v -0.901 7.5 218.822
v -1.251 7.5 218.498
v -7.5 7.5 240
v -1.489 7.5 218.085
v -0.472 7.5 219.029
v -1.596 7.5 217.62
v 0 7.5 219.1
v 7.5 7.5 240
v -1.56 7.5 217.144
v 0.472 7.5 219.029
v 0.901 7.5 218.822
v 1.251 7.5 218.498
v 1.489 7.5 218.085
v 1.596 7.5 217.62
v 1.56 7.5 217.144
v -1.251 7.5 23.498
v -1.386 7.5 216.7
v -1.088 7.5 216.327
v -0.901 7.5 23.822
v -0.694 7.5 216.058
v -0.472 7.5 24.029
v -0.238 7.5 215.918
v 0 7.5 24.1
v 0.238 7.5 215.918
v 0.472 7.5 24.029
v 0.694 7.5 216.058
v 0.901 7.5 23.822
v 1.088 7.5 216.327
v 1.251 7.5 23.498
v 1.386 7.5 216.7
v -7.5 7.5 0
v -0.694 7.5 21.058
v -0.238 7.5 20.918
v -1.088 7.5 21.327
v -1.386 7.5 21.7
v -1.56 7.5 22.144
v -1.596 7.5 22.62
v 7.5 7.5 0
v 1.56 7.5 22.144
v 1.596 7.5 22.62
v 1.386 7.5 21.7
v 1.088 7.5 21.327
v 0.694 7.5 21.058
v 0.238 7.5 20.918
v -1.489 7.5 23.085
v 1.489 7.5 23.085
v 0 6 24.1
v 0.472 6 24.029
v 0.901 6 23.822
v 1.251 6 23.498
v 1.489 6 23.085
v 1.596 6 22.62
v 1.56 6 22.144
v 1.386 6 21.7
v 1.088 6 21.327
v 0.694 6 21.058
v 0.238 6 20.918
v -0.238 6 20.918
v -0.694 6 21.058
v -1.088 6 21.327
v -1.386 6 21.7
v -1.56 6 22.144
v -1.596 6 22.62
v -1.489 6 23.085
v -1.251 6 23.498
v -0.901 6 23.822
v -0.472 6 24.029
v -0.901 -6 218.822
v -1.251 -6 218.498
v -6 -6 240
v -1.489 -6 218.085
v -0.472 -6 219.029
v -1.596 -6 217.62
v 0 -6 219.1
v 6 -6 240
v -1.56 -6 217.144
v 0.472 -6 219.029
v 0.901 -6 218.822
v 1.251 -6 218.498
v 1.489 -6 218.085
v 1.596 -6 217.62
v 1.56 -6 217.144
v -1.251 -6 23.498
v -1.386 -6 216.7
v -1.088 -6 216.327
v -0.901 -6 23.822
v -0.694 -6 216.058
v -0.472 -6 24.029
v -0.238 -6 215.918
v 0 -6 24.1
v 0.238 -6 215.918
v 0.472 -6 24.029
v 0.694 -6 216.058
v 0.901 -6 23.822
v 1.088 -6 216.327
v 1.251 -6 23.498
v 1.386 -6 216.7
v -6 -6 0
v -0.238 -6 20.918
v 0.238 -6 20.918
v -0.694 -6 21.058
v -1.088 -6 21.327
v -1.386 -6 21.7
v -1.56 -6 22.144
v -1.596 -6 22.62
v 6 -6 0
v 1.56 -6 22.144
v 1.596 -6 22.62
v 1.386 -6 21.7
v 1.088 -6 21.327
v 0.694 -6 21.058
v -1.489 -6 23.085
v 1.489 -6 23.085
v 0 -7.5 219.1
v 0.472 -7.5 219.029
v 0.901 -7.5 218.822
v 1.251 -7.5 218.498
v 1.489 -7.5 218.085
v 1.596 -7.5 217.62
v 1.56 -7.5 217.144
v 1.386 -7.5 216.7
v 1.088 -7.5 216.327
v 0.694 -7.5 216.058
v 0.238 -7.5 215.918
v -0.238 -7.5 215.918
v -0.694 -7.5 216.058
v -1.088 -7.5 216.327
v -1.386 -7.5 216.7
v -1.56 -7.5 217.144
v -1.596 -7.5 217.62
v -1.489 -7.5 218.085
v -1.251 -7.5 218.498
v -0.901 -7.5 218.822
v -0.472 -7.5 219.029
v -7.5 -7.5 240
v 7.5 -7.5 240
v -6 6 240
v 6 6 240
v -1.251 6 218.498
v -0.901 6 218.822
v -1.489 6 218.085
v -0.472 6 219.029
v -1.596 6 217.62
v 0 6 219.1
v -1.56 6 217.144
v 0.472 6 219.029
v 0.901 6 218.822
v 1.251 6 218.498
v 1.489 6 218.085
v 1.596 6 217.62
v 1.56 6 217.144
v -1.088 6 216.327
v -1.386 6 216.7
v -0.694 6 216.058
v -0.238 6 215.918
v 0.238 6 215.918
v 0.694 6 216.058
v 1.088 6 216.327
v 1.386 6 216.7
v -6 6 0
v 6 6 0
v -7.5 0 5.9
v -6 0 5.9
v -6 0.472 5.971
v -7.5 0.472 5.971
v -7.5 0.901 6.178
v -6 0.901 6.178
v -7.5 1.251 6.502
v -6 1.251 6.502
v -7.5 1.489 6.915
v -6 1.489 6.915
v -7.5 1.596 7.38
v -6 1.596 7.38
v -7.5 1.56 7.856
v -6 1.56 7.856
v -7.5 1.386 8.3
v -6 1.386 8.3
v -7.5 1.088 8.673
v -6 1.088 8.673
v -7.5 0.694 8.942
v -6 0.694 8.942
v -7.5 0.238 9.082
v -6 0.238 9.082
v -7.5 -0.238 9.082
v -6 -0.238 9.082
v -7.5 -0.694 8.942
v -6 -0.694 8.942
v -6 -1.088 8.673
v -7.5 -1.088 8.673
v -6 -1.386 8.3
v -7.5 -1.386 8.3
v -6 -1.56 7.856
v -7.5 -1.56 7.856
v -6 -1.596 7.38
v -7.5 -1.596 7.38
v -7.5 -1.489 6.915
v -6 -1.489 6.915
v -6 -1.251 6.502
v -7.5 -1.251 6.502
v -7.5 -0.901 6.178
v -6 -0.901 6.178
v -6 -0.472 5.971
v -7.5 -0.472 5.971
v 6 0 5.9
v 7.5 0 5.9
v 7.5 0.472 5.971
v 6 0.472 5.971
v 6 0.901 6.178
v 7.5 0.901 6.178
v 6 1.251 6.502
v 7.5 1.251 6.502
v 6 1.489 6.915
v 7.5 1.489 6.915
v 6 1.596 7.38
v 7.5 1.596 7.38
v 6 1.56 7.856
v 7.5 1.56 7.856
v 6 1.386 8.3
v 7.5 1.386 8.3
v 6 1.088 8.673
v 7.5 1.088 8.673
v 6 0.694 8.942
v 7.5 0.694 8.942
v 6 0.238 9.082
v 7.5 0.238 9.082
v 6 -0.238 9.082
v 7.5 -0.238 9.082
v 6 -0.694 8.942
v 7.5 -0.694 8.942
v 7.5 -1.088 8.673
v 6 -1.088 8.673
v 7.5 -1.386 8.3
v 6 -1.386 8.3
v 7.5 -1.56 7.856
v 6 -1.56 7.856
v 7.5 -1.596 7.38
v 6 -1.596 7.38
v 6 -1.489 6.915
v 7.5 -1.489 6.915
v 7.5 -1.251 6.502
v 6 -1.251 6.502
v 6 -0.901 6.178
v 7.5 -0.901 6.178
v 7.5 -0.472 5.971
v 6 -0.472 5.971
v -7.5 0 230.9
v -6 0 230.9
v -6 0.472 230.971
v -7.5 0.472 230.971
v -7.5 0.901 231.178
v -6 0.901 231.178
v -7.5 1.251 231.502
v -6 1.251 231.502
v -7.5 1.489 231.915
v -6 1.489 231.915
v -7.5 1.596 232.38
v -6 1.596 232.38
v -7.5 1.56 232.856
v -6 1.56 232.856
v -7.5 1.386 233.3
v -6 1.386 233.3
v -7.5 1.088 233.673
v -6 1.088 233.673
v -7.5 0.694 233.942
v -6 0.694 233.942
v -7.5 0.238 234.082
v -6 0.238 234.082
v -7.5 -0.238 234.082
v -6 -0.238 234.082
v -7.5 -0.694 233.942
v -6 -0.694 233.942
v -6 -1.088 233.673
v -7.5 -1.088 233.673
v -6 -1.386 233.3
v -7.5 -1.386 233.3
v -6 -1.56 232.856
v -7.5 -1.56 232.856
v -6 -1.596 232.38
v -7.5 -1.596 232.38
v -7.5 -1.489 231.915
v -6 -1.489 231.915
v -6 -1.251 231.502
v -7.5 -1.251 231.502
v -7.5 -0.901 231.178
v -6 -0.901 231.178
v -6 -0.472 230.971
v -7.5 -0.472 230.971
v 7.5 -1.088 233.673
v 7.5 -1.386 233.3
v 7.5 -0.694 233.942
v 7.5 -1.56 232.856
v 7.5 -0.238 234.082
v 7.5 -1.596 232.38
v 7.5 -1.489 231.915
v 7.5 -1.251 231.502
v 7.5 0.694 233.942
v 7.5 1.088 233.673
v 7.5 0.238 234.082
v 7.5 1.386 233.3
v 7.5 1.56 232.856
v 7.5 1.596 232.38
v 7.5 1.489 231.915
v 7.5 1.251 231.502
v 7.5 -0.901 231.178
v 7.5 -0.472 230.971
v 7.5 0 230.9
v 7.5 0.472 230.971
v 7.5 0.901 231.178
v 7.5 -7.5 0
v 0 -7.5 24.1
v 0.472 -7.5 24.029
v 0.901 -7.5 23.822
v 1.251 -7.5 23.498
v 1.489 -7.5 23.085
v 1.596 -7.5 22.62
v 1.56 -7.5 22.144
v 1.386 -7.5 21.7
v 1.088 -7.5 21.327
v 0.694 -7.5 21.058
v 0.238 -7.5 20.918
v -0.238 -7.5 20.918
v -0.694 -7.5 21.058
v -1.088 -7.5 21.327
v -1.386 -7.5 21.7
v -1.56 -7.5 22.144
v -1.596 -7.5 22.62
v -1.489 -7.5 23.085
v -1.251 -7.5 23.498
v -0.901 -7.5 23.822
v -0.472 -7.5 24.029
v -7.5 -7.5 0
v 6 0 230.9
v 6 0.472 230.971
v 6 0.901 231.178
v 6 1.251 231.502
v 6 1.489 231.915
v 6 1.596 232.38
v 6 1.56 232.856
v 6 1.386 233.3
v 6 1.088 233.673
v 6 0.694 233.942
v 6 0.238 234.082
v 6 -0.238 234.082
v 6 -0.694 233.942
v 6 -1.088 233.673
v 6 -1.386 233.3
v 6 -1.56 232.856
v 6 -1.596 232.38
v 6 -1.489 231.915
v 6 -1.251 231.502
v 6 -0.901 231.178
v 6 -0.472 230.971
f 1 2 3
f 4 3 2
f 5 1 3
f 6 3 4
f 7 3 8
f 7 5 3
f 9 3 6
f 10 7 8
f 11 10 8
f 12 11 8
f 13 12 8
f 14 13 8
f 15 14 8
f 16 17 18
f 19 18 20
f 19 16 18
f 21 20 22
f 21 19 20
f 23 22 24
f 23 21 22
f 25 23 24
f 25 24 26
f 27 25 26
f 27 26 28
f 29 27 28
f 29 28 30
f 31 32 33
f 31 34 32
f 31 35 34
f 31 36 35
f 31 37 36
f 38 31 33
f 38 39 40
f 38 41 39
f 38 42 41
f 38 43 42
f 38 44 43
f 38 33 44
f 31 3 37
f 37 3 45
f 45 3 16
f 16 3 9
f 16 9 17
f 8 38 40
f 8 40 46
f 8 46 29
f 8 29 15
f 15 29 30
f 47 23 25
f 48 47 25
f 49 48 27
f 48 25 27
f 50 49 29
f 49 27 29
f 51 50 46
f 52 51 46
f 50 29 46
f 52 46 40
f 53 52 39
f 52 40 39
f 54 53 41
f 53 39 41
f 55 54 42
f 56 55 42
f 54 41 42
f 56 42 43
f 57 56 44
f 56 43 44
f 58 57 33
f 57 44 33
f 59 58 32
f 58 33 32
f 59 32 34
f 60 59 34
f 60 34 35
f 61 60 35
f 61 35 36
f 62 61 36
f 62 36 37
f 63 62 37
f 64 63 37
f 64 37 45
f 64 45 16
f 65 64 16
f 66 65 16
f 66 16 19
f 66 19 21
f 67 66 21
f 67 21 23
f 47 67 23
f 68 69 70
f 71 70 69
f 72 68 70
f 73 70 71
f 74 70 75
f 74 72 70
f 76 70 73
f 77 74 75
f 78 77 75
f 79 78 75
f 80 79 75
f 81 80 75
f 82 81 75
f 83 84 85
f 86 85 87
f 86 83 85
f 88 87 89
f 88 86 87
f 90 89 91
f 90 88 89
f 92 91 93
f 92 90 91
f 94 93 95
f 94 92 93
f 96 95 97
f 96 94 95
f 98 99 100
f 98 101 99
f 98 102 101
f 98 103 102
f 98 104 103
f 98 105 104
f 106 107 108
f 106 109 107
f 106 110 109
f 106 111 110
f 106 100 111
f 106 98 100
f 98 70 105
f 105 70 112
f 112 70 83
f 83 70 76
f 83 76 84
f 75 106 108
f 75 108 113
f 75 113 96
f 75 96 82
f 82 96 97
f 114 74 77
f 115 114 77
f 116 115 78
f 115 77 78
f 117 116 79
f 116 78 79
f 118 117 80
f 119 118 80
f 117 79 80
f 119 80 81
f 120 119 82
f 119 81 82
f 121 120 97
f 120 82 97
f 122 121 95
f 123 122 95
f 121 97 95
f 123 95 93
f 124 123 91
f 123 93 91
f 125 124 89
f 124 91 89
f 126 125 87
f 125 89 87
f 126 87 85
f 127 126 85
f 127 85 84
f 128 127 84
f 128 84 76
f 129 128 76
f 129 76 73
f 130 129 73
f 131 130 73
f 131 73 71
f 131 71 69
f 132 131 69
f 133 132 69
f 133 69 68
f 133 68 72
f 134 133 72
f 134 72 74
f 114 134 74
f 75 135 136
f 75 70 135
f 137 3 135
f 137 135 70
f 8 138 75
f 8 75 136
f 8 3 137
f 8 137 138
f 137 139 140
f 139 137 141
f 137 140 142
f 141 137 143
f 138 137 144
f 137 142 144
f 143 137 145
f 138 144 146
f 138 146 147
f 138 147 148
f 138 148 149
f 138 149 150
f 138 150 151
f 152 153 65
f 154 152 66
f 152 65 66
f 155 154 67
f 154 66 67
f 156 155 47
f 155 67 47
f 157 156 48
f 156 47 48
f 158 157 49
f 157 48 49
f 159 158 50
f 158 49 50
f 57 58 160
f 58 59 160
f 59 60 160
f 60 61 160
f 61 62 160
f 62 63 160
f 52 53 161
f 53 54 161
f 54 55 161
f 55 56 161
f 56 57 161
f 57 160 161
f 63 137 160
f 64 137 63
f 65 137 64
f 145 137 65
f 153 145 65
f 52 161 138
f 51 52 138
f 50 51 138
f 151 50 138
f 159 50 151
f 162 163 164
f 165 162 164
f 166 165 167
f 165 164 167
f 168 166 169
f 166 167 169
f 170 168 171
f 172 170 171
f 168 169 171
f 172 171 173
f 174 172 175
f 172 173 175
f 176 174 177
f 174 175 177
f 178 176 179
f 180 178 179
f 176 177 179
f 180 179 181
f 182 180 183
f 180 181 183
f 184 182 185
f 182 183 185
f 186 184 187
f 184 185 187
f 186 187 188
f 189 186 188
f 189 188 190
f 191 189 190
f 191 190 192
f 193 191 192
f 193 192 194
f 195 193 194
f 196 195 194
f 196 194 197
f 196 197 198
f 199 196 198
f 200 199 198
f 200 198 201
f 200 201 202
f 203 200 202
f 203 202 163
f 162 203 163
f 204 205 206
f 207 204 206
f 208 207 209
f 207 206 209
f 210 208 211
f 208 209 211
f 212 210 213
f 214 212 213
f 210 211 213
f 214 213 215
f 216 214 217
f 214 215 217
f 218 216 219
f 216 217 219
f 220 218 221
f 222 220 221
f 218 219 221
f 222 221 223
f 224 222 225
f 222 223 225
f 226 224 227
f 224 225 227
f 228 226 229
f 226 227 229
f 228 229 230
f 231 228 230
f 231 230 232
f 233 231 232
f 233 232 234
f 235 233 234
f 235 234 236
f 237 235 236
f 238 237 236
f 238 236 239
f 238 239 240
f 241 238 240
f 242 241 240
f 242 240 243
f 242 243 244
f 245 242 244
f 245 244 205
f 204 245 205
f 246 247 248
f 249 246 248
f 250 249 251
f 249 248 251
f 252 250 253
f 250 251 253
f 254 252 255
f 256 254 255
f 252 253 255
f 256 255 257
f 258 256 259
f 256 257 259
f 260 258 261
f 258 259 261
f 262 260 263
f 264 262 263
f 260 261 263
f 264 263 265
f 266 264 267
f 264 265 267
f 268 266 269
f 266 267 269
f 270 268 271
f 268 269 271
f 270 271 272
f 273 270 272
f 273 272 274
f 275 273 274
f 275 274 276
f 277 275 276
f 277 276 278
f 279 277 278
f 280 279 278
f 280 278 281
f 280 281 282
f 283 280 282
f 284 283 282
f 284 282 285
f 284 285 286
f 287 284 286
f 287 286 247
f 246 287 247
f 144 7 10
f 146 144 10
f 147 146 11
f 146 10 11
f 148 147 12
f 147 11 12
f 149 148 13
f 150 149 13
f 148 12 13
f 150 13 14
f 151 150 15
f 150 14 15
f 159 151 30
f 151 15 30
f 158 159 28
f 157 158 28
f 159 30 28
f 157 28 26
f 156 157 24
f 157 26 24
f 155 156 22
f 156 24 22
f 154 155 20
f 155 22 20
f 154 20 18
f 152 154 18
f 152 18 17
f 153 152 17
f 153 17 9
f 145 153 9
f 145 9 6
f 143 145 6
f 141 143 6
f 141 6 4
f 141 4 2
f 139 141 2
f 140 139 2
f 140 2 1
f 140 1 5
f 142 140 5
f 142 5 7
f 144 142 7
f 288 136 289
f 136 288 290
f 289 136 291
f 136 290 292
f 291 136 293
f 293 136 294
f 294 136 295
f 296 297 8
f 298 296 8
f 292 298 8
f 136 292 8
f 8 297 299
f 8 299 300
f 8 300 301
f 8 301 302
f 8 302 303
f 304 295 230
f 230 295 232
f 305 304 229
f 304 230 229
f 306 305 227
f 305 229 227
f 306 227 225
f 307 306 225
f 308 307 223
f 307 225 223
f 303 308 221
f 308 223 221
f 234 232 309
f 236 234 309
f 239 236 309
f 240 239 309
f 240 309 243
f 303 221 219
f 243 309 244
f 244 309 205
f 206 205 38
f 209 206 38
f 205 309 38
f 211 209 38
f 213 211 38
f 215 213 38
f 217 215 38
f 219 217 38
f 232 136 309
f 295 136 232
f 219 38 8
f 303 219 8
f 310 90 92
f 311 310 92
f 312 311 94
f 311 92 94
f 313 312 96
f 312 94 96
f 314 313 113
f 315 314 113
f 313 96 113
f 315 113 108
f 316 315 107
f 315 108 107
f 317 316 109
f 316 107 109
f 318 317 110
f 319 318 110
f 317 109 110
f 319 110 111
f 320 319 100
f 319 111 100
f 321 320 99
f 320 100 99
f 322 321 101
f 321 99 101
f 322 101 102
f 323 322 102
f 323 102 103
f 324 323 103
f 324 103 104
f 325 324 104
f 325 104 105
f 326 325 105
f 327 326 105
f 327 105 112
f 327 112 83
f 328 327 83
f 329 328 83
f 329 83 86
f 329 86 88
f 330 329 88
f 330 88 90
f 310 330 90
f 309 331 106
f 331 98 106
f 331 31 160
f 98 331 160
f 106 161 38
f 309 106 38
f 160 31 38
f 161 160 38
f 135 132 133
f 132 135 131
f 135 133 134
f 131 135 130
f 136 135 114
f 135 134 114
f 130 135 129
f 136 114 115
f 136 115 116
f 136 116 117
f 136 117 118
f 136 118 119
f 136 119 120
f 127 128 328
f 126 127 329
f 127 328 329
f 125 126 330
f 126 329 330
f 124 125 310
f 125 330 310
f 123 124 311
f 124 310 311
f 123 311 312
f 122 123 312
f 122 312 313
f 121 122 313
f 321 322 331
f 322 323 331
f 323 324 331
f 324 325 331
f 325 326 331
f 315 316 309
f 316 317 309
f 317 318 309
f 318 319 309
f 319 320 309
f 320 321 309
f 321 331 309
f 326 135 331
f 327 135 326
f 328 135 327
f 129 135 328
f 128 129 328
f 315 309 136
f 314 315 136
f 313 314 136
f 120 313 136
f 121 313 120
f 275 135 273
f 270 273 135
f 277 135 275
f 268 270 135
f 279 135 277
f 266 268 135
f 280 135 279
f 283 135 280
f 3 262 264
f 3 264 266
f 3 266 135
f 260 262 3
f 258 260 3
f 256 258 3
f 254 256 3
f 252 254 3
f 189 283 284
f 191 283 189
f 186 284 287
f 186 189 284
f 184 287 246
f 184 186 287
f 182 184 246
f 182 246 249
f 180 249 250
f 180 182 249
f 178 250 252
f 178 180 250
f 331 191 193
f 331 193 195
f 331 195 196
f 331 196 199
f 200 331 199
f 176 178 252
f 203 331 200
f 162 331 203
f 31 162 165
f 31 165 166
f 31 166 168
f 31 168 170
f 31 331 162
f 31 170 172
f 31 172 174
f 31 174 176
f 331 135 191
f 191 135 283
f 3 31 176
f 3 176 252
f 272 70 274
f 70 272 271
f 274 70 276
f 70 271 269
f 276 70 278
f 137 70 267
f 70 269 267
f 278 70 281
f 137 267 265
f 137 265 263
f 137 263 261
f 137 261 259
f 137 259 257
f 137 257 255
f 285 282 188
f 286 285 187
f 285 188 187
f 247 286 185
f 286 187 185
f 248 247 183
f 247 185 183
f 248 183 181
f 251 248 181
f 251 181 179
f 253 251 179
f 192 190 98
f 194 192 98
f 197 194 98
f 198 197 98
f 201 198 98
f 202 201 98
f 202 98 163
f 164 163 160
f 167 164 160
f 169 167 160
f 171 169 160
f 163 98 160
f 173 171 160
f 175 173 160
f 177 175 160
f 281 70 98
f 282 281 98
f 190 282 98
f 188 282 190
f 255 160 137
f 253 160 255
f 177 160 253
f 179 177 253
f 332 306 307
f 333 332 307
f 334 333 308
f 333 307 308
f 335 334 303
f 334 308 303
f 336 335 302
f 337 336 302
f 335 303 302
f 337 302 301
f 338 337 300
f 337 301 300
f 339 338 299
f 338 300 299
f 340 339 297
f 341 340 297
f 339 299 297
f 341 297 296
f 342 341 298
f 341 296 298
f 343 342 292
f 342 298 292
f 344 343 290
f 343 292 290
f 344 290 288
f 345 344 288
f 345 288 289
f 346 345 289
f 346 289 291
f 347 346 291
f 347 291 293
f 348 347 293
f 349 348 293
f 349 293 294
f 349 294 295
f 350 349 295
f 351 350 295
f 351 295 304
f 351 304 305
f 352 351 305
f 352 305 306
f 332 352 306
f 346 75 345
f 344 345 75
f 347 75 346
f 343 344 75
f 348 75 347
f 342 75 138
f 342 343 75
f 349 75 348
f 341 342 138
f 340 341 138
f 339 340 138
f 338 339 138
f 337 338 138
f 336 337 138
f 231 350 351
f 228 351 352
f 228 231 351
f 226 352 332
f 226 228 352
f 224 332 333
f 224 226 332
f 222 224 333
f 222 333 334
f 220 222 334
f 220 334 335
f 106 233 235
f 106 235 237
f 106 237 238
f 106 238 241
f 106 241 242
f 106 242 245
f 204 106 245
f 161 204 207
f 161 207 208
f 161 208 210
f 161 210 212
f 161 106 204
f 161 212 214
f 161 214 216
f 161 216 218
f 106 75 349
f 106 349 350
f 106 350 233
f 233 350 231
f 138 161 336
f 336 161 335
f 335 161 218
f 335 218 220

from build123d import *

# Parameters (mm, degrees)
SKETCH_1_W          = 15
SKETCH_1_H          = 15
SKETCH_1_W_2        = 12
SKETCH_1_H_2        = 12
EXTRUDE_1_DEPTH     = 240
SKETCH_2_R          = 1.6
CUT_EXTRUDE_1_DEPTH = 241.585223985
SKETCH_3_R          = 1.6
CUT_EXTRUDE_2_DEPTH = 241.585223985


with BuildPart() as part:
    # ｽｹｯﾁ1 → ﾎﾞｽ - 押し出し1 (new body)
    with BuildSketch(Plane.XY):
        Rectangle(SKETCH_1_W, SKETCH_1_H)
        Rectangle(SKETCH_1_W_2, SKETCH_1_H_2, mode=Mode.SUBTRACT)
    extrude(amount=EXTRUDE_1_DEPTH)

    # ｽｹｯﾁ2 → ｶｯﾄ - 押し出し1 (cut, through all)
    with BuildSketch(Plane(origin=(0, 7.5, 0), x_dir=(1, 0, 0), z_dir=(0, 1, 0))):
        with Locations(Location((0, -22.5, 0), (0, 0, 270))):
            Circle(SKETCH_2_R)
        with Locations(Location((0, -217.5, 0), (0, 0, 270))):
            Circle(SKETCH_2_R)
    extrude(amount=-CUT_EXTRUDE_1_DEPTH, mode=Mode.SUBTRACT)

    # ｽｹｯﾁ3 → ｶｯﾄ - 押し出し2 (cut, through all)
    with BuildSketch(Plane(origin=(7.5, 0, 0), x_dir=(0, 0, -1), z_dir=(1, 0, 0))):
        with Locations((-232.5, 0)):
            Circle(SKETCH_3_R)
        with Locations((-7.5, 0)):
            Circle(SKETCH_3_R)
    extrude(amount=-CUT_EXTRUDE_2_DEPTH, mode=Mode.SUBTRACT)


solid = part.part
